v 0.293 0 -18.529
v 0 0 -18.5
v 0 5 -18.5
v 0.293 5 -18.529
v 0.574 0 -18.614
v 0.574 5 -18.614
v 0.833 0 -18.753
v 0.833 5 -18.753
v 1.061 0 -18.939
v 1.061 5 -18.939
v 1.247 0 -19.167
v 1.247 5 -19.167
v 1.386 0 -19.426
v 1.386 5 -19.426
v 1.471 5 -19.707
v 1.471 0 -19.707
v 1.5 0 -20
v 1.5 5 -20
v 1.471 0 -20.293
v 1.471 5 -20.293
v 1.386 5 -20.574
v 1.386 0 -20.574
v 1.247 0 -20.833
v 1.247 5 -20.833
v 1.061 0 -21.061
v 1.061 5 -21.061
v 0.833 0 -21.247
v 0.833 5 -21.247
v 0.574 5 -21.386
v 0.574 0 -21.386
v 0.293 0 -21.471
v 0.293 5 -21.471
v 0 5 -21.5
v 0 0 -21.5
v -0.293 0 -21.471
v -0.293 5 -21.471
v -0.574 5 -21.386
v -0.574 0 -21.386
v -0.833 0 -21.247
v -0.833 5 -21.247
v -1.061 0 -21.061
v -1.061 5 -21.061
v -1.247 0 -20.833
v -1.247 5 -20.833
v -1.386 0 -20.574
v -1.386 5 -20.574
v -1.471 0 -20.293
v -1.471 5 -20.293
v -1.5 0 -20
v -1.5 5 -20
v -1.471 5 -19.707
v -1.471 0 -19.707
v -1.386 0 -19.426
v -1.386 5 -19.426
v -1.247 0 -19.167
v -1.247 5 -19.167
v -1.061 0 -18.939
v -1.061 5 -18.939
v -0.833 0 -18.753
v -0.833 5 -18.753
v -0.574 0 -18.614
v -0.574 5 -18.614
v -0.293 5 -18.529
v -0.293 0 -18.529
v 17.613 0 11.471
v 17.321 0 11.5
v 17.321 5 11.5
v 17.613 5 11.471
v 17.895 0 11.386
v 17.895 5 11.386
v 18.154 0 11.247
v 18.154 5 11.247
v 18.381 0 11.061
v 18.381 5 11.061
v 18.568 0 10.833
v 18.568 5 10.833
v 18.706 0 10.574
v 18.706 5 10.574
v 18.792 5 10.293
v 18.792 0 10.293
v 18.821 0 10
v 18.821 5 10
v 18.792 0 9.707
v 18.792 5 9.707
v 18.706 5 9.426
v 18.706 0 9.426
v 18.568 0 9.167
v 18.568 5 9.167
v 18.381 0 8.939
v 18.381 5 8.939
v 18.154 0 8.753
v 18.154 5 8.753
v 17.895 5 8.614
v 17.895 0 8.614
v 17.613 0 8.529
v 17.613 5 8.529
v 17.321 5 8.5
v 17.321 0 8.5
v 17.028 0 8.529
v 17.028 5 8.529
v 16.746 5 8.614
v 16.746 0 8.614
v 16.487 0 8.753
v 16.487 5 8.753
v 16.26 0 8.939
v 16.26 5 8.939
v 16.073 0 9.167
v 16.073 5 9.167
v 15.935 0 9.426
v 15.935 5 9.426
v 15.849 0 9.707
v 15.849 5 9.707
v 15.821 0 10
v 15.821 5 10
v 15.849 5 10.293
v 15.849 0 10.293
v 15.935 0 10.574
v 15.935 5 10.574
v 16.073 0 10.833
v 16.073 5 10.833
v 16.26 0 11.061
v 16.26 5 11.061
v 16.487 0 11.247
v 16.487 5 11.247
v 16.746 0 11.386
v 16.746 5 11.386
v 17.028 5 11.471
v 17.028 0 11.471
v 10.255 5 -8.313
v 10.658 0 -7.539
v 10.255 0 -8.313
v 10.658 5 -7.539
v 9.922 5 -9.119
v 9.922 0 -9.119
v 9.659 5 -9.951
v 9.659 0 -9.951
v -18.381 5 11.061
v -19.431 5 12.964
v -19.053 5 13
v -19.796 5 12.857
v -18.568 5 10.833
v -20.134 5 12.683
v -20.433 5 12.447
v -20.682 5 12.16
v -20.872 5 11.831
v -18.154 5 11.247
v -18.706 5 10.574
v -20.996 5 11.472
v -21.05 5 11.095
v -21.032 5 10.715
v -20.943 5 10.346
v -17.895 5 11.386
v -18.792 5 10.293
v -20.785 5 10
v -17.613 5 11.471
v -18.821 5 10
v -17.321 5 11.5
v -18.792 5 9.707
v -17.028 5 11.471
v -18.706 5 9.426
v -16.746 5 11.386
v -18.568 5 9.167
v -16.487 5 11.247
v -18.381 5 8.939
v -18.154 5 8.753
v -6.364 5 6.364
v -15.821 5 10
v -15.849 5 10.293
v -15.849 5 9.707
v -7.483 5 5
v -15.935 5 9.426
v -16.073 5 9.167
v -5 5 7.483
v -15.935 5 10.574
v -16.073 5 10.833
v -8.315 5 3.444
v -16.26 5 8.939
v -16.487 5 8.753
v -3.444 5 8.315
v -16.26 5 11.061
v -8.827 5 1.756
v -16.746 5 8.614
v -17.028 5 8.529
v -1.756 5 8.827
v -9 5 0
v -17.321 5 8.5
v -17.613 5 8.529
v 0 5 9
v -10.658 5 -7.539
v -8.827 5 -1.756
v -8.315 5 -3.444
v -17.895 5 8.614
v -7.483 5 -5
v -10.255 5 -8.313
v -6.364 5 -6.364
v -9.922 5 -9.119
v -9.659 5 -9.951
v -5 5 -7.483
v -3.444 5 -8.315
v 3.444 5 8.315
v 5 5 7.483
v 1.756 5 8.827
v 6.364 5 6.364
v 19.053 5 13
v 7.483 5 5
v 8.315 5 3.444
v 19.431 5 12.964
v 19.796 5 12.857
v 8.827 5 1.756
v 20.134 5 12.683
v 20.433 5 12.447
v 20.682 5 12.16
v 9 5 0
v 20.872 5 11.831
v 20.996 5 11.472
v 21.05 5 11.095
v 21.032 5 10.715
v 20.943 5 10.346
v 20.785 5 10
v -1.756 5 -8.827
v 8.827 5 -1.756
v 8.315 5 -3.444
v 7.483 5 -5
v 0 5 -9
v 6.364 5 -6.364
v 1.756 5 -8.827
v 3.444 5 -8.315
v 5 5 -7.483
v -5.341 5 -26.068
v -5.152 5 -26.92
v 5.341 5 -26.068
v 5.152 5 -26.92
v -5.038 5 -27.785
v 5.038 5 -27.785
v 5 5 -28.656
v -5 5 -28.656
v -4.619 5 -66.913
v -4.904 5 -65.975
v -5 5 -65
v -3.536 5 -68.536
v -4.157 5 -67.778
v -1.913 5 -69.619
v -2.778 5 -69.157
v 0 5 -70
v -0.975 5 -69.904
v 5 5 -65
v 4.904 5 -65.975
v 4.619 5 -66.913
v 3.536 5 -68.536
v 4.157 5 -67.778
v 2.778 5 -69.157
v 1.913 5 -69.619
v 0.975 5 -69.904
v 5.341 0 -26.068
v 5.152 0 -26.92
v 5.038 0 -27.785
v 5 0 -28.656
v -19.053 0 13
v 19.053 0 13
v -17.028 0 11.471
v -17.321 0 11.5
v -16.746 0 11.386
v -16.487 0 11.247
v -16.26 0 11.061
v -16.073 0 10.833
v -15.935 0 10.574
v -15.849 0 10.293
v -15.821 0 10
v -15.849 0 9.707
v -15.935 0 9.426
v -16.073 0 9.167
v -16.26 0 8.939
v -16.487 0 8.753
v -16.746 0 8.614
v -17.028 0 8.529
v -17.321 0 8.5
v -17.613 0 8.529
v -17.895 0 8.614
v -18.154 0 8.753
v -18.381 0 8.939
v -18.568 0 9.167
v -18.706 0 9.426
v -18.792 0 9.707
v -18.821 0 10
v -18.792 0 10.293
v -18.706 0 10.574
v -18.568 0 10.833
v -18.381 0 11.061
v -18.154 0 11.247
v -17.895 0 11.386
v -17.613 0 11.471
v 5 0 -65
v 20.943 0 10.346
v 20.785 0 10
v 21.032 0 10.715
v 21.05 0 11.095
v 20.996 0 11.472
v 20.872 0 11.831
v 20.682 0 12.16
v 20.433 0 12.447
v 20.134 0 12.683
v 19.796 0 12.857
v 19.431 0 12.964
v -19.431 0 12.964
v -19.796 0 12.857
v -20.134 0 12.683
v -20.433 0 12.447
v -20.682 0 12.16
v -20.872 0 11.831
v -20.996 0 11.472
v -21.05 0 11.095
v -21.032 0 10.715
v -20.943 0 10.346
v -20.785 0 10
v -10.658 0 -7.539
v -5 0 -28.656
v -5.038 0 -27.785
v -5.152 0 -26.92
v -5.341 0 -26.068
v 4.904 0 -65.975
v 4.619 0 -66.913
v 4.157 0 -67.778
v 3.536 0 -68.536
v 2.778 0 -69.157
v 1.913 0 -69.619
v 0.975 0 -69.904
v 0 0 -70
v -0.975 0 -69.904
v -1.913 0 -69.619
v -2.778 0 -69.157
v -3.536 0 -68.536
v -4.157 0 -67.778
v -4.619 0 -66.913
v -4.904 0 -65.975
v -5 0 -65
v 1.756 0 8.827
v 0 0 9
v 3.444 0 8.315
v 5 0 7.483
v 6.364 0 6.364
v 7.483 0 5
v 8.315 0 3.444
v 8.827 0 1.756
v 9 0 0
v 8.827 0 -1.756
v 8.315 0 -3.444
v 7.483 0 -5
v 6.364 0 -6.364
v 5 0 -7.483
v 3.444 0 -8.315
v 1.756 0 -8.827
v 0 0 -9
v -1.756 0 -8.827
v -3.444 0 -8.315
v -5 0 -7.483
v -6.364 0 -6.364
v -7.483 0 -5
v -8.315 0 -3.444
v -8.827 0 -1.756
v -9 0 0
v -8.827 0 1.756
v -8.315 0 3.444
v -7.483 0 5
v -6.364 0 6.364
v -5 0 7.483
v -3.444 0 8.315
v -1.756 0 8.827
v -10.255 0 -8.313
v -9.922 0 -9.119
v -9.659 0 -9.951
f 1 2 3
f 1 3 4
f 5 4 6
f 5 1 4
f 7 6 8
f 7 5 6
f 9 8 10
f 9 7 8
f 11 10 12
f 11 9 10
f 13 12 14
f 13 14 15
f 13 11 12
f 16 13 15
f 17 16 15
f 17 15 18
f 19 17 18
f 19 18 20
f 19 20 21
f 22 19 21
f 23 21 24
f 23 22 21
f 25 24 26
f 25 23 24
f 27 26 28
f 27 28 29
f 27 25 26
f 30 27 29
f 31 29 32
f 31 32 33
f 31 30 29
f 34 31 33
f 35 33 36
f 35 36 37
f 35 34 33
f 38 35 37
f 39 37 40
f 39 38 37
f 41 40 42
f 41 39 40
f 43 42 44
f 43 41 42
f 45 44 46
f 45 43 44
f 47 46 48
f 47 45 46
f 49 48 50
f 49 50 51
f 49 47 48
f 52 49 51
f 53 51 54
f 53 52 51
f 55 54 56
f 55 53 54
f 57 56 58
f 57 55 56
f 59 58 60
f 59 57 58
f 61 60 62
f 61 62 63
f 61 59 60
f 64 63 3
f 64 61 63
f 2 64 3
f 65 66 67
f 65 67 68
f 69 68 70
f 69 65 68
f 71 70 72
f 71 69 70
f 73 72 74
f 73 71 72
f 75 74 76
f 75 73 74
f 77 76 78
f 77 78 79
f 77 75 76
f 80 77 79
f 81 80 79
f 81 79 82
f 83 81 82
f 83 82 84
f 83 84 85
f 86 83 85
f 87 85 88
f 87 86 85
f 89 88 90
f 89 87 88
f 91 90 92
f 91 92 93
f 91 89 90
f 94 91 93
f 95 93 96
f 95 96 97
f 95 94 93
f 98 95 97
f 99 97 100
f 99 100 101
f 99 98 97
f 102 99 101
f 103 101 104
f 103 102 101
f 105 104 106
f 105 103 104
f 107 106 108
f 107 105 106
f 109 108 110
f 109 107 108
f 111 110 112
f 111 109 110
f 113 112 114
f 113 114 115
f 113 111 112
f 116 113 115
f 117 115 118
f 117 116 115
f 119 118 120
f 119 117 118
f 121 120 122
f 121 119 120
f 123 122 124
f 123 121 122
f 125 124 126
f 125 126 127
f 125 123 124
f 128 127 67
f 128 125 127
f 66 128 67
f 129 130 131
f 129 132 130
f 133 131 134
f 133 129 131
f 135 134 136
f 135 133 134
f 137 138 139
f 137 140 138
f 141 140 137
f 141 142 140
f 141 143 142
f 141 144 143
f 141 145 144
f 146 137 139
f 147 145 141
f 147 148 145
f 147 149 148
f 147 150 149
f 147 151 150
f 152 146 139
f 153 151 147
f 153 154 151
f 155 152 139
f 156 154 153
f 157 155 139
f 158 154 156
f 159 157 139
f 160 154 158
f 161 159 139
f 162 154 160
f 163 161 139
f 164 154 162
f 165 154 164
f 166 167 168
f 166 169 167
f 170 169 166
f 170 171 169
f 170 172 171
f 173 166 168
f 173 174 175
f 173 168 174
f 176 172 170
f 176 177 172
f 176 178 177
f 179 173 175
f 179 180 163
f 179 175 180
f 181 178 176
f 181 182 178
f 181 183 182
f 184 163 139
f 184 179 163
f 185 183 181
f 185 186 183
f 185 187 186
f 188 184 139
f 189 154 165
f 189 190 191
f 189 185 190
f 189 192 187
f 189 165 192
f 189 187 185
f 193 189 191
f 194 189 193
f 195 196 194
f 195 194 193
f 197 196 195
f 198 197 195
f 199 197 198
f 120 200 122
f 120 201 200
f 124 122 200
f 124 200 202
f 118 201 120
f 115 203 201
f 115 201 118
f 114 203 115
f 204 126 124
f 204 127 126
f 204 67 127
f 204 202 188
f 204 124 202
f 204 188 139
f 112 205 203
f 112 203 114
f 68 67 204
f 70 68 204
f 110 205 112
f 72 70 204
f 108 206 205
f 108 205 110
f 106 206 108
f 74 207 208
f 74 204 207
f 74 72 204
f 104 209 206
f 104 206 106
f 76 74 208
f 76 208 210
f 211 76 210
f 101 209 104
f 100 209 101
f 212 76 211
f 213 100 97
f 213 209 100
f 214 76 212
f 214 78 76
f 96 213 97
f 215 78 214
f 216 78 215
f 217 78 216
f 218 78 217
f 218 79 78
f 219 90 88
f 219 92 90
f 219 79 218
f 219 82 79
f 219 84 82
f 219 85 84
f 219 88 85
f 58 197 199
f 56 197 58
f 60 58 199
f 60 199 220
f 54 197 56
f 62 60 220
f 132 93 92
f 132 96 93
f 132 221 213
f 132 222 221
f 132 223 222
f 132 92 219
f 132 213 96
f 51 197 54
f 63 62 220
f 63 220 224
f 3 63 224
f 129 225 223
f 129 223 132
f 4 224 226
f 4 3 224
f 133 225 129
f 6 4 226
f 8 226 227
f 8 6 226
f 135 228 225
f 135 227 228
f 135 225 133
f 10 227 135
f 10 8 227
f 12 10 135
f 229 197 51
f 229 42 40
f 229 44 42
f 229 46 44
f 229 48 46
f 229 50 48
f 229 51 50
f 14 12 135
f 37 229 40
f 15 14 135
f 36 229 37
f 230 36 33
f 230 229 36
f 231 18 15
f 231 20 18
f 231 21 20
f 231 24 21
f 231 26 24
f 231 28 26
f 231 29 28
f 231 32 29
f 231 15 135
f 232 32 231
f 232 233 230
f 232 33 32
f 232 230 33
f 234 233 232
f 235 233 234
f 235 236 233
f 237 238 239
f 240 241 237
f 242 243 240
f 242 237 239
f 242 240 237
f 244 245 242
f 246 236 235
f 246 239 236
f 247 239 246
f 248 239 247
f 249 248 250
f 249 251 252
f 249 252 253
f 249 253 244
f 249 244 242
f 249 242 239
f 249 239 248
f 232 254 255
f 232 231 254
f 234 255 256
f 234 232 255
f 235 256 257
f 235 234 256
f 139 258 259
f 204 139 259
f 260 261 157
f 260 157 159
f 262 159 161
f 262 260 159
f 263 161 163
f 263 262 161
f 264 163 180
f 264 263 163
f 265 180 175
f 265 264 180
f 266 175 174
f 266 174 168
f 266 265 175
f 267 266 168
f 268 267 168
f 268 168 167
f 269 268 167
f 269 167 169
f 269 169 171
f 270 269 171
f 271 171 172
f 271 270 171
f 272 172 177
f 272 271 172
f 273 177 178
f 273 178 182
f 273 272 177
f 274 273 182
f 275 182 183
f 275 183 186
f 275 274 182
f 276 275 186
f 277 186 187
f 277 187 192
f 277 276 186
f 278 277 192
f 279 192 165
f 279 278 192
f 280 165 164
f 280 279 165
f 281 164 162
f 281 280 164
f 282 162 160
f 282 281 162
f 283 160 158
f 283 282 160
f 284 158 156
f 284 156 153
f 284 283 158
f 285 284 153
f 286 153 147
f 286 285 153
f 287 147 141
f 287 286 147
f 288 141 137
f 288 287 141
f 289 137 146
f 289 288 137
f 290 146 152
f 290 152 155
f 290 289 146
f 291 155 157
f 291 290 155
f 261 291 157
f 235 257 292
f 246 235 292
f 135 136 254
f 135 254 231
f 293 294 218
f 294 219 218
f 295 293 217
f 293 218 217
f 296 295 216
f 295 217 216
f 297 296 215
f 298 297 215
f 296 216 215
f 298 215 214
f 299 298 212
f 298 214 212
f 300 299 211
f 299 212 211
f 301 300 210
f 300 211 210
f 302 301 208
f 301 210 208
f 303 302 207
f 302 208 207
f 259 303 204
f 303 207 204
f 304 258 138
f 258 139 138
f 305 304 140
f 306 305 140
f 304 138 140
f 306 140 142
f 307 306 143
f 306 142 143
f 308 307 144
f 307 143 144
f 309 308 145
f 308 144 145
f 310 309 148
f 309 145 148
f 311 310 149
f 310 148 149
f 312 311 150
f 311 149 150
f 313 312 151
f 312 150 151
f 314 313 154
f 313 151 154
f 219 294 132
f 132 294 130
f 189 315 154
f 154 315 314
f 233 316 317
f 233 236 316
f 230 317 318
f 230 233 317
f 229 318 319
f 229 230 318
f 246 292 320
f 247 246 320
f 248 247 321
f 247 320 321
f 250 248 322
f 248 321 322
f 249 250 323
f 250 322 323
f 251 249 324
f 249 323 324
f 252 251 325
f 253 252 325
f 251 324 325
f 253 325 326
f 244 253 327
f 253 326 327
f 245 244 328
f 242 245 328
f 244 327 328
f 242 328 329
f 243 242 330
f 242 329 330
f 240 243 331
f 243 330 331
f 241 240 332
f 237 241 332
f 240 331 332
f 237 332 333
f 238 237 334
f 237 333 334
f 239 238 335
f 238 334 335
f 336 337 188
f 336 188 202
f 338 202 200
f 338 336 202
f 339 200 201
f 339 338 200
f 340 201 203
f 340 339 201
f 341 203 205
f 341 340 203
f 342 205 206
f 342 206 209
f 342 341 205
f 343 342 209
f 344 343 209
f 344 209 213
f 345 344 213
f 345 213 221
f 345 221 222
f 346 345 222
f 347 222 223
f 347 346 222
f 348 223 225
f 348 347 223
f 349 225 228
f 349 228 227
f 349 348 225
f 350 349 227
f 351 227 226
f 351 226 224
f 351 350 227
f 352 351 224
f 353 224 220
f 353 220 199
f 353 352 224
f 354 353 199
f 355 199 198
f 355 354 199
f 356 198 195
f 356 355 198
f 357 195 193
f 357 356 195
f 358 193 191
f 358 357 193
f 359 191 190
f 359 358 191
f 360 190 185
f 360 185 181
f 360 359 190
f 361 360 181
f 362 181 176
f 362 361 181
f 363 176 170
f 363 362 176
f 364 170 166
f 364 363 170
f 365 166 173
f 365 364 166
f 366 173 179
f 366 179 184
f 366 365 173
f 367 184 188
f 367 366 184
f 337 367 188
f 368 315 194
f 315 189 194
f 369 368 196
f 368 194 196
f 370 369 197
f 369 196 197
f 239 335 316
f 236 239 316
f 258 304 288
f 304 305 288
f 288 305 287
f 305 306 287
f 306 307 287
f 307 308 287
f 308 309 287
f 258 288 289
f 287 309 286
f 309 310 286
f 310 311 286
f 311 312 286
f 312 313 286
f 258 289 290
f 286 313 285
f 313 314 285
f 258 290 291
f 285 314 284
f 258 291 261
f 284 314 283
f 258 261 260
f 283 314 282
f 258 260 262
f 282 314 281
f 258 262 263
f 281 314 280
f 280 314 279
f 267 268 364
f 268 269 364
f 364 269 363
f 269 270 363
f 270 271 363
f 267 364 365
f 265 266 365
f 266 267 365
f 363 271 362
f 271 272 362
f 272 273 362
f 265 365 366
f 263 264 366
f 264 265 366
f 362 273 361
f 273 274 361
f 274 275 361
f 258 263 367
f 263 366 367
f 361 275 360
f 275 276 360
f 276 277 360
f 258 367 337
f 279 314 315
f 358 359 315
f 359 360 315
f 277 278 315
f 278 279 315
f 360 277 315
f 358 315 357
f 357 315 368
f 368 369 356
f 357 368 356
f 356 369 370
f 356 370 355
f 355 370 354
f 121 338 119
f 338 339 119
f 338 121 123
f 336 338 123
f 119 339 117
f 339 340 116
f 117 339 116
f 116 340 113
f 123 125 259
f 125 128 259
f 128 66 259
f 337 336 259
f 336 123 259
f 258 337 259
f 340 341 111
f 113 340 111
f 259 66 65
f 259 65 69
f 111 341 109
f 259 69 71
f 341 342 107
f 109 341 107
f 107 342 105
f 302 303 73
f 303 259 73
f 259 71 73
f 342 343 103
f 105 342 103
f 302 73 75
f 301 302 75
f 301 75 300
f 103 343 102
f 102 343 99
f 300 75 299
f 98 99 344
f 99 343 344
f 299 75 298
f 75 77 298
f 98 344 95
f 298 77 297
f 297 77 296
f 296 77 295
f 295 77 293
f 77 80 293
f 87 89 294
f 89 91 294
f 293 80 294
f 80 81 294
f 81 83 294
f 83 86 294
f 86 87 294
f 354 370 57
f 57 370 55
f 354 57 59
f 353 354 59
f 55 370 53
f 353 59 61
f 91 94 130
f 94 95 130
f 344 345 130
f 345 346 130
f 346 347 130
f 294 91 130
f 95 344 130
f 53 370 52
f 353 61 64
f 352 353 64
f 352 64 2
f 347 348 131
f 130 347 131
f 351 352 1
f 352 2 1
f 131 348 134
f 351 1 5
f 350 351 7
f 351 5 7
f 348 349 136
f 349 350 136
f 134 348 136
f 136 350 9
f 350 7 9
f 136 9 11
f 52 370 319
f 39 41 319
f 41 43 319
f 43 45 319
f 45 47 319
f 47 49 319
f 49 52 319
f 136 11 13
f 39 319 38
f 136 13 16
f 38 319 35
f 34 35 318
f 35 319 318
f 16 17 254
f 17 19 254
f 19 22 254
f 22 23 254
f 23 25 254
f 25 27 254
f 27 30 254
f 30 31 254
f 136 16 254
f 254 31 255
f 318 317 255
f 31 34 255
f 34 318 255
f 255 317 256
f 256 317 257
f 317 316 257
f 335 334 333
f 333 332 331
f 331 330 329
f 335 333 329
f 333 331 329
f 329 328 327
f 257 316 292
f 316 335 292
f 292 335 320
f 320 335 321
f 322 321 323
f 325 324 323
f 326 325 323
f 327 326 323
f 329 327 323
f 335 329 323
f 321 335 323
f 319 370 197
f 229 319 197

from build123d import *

# Parameters (mm, degrees)
SKETCH_1_R      = 9
SKETCH_1_R_2    = 1.5
EXTRUDE_1_DEPTH = 5
FILLET_1_R      = 2
CHAMFER_1_SIZE  = 10
FILLET_3_R      = 10


with BuildPart() as part:
    # 草图1 → 凸台-拉伸1 (new body)
    with BuildSketch(Plane(origin=(0, 0, 0), x_dir=(1, 0, 0), z_dir=(0, 1, 0))):
        with BuildLine():
            Line((5, 17.339745962), (5, 65))
            ThreePointArc((5, 65), (0, 70), (-5, 65))
            Line((-5, 65), (-5, 17.339745962))
            Line((-5, 17.339745962), (-22.516660498, -13))
            Line((-22.516660498, -13), (22.516660498, -13))
            Line((22.516660498, -13), (5, 17.339745962))
        make_face()
        with Locations(Location((0, 0, 0), (0, 0, 270))):
            Circle(SKETCH_1_R, mode=Mode.SUBTRACT)
        with Locations(Location((0, 20, 0), (0, 0, 270))):
            Circle(SKETCH_1_R_2, mode=Mode.SUBTRACT)
        with Locations(Location((-17.320508076, -10, 0), (0, 0, 270))):
            Circle(SKETCH_1_R_2, mode=Mode.SUBTRACT)
        with Locations(Location((17.320508076, -10, 0), (0, 0, 270))):
            Circle(SKETCH_1_R_2, mode=Mode.SUBTRACT)
    extrude(amount=EXTRUDE_1_DEPTH)

    # 圆角1
    fillet_1_edges = [part.edges().sort_by_distance(p)[0] for p in [
        (22.516660498, 2.5, 13),
        (-22.516660498, 2.5, 13),
    ]]
    fillet(fillet_1_edges, radius=FILLET_1_R)

    # 倒角1
    chamfer_1_edges = [part.edges().sort_by_distance(p)[0] for p in [
        (-5, 2.5, -17.339745962),
        (5, 2.5, -17.339745962),
    ]]
    chamfer(chamfer_1_edges, length=CHAMFER_1_SIZE)

    # 圆角3
    fillet_3_edges = [part.edges().sort_by_distance(p)[0] for p in [
        (5, 2.5, -27.339745962),
        (10, 2.5, -8.679491924),
        (-10, 2.5, -8.679491924),
        (-5, 2.5, -27.339745962),
    ]]
    fillet(fillet_3_edges, radius=FILLET_3_R)


solid = part.part
